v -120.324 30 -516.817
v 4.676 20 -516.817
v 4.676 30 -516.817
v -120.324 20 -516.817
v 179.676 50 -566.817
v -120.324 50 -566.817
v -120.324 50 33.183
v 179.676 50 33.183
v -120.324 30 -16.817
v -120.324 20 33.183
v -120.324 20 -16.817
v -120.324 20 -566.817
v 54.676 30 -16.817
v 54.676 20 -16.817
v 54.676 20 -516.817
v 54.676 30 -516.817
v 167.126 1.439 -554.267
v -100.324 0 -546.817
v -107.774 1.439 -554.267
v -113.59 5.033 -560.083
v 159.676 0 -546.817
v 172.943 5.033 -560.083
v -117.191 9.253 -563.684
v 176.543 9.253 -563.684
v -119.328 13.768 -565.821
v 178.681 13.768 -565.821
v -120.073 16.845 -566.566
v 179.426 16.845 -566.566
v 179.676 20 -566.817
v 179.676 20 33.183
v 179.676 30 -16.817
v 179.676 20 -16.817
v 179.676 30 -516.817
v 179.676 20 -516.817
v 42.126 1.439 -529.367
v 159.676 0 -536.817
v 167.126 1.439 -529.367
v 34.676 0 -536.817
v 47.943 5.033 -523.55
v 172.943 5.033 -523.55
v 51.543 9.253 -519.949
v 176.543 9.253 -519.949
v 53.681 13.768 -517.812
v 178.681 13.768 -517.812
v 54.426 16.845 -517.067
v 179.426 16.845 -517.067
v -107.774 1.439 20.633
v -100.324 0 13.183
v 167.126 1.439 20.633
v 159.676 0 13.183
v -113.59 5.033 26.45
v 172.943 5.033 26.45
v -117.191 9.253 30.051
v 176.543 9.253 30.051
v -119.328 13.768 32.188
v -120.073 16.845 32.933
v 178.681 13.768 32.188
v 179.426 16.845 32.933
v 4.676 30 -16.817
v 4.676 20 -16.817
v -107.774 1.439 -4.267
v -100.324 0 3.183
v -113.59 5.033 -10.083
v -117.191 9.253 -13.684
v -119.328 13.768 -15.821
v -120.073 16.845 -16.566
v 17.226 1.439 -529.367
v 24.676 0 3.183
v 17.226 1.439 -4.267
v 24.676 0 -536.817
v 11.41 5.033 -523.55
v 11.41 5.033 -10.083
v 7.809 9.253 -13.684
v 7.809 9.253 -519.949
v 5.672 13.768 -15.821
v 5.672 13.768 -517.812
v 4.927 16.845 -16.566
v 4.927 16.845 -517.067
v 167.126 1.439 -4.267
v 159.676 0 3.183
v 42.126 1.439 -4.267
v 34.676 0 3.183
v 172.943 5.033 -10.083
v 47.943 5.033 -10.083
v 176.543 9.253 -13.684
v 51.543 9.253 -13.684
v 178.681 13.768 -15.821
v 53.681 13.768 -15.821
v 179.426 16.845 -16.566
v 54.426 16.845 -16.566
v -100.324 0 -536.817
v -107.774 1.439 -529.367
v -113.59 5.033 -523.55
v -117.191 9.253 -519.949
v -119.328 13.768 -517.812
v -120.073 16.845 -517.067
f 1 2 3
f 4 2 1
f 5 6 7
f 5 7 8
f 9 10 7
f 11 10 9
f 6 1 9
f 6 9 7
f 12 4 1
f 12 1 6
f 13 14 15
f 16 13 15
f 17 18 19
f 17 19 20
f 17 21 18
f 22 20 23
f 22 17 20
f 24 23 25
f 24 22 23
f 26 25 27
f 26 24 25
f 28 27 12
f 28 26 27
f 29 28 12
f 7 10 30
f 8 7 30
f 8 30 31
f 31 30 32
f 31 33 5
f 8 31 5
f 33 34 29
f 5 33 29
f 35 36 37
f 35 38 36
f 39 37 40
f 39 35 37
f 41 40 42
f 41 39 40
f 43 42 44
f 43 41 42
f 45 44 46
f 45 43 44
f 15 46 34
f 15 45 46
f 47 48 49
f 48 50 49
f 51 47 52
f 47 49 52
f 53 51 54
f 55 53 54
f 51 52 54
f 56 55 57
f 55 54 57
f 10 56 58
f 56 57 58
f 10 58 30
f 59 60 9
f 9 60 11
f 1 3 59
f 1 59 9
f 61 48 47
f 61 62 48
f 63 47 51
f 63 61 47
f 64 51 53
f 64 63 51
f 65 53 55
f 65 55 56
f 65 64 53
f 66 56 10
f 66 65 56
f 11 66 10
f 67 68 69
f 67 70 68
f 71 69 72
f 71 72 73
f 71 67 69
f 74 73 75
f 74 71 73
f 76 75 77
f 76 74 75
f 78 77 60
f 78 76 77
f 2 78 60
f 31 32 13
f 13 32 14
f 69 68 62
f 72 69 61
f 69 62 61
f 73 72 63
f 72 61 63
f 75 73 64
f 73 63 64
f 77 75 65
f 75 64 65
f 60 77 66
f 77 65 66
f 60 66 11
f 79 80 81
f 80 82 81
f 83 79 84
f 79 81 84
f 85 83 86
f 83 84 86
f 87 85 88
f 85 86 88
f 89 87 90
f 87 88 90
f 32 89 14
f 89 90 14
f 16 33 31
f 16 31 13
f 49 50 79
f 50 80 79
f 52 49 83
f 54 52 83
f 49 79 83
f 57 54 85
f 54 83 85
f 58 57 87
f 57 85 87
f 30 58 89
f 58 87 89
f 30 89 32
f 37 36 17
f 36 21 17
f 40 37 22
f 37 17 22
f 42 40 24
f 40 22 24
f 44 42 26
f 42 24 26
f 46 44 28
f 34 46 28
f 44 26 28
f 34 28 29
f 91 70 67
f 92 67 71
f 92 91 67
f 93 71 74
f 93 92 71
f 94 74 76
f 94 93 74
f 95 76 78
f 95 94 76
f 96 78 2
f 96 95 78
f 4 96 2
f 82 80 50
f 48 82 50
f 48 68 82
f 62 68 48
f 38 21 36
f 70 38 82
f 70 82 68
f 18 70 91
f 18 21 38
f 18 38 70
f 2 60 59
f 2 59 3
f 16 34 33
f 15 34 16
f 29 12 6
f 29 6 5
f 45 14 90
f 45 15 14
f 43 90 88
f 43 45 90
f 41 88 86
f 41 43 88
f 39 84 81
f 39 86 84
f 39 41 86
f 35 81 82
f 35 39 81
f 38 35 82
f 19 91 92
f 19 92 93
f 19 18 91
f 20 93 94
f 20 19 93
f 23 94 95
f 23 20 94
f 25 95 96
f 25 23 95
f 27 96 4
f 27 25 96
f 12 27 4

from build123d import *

# Parameters (mm, degrees)
SKETCH1_W           = 300
SKETCH1_H           = 600
BOSS_EXTRUDE1_DEPTH = 50
SKETCH2_W           = 300
SKETCH2_H           = 500
CUT_EXTRUDE1_DEPTH  = 30
SKETCH3_W           = 50
SKETCH3_H           = 500
BOSS_EXTRUDE2_DEPTH = 36
FILLET1_R           = 20


with BuildPart() as part:
    # Sketch1 → Boss-Extrude1 (new body)
    with BuildSketch(Plane(origin=(0, 0, 0), x_dir=(1, 0, 0), z_dir=(0, 1, 0))):
        with Locations((29.676258993, 266.816546763)):
            Rectangle(SKETCH1_W, SKETCH1_H)
    extrude(amount=BOSS_EXTRUDE1_DEPTH)

    # Sketch2 → Cut-Extrude1 (cut)
    with BuildSketch(Plane(origin=(0, 0, 0), x_dir=(-1, 0, 0), z_dir=(0, -1, 0))):
        with Locations((-29.676258993, 266.816546763)):
            Rectangle(SKETCH2_W, SKETCH2_H)
    extrude(amount=-CUT_EXTRUDE1_DEPTH, mode=Mode.SUBTRACT)

    # Sketch3 → Boss-Extrude2 (add)
    with BuildSketch(Plane(origin=(0, 0, 0), x_dir=(-1, 0, 0), z_dir=(0, -1, 0))):
        with Locations((-29.676258993, 266.816546763)):
            Rectangle(SKETCH3_W, SKETCH3_H)
    extrude(amount=-BOSS_EXTRUDE2_DEPTH)

    # Fillet1
    fillet1_edges = [part.edges().sort_by_distance(p)[0] for p in [
        (-120.323741007, 0, 8.183453237),
        (179.676258993, 0, -541.816546763),
        (-57.823741007, 0, -516.816546763),
        (117.176258993, 0, -16.816546763),
        (117.176258993, 0, -516.816546763),
        (-57.823741007, 0, -16.816546763),
        (4.676258993, 0, -266.816546763),
        (54.676258993, 0, -266.816546763),
        (29.676258993, 0, -566.816546763),
        (179.676258993, 0, 8.183453237),
        (29.676258993, 0, 33.183453237),
        (-120.323741007, 0, -541.816546763),
    ]]
    fillet(fillet1_edges, radius=FILLET1_R)


solid = part.part
